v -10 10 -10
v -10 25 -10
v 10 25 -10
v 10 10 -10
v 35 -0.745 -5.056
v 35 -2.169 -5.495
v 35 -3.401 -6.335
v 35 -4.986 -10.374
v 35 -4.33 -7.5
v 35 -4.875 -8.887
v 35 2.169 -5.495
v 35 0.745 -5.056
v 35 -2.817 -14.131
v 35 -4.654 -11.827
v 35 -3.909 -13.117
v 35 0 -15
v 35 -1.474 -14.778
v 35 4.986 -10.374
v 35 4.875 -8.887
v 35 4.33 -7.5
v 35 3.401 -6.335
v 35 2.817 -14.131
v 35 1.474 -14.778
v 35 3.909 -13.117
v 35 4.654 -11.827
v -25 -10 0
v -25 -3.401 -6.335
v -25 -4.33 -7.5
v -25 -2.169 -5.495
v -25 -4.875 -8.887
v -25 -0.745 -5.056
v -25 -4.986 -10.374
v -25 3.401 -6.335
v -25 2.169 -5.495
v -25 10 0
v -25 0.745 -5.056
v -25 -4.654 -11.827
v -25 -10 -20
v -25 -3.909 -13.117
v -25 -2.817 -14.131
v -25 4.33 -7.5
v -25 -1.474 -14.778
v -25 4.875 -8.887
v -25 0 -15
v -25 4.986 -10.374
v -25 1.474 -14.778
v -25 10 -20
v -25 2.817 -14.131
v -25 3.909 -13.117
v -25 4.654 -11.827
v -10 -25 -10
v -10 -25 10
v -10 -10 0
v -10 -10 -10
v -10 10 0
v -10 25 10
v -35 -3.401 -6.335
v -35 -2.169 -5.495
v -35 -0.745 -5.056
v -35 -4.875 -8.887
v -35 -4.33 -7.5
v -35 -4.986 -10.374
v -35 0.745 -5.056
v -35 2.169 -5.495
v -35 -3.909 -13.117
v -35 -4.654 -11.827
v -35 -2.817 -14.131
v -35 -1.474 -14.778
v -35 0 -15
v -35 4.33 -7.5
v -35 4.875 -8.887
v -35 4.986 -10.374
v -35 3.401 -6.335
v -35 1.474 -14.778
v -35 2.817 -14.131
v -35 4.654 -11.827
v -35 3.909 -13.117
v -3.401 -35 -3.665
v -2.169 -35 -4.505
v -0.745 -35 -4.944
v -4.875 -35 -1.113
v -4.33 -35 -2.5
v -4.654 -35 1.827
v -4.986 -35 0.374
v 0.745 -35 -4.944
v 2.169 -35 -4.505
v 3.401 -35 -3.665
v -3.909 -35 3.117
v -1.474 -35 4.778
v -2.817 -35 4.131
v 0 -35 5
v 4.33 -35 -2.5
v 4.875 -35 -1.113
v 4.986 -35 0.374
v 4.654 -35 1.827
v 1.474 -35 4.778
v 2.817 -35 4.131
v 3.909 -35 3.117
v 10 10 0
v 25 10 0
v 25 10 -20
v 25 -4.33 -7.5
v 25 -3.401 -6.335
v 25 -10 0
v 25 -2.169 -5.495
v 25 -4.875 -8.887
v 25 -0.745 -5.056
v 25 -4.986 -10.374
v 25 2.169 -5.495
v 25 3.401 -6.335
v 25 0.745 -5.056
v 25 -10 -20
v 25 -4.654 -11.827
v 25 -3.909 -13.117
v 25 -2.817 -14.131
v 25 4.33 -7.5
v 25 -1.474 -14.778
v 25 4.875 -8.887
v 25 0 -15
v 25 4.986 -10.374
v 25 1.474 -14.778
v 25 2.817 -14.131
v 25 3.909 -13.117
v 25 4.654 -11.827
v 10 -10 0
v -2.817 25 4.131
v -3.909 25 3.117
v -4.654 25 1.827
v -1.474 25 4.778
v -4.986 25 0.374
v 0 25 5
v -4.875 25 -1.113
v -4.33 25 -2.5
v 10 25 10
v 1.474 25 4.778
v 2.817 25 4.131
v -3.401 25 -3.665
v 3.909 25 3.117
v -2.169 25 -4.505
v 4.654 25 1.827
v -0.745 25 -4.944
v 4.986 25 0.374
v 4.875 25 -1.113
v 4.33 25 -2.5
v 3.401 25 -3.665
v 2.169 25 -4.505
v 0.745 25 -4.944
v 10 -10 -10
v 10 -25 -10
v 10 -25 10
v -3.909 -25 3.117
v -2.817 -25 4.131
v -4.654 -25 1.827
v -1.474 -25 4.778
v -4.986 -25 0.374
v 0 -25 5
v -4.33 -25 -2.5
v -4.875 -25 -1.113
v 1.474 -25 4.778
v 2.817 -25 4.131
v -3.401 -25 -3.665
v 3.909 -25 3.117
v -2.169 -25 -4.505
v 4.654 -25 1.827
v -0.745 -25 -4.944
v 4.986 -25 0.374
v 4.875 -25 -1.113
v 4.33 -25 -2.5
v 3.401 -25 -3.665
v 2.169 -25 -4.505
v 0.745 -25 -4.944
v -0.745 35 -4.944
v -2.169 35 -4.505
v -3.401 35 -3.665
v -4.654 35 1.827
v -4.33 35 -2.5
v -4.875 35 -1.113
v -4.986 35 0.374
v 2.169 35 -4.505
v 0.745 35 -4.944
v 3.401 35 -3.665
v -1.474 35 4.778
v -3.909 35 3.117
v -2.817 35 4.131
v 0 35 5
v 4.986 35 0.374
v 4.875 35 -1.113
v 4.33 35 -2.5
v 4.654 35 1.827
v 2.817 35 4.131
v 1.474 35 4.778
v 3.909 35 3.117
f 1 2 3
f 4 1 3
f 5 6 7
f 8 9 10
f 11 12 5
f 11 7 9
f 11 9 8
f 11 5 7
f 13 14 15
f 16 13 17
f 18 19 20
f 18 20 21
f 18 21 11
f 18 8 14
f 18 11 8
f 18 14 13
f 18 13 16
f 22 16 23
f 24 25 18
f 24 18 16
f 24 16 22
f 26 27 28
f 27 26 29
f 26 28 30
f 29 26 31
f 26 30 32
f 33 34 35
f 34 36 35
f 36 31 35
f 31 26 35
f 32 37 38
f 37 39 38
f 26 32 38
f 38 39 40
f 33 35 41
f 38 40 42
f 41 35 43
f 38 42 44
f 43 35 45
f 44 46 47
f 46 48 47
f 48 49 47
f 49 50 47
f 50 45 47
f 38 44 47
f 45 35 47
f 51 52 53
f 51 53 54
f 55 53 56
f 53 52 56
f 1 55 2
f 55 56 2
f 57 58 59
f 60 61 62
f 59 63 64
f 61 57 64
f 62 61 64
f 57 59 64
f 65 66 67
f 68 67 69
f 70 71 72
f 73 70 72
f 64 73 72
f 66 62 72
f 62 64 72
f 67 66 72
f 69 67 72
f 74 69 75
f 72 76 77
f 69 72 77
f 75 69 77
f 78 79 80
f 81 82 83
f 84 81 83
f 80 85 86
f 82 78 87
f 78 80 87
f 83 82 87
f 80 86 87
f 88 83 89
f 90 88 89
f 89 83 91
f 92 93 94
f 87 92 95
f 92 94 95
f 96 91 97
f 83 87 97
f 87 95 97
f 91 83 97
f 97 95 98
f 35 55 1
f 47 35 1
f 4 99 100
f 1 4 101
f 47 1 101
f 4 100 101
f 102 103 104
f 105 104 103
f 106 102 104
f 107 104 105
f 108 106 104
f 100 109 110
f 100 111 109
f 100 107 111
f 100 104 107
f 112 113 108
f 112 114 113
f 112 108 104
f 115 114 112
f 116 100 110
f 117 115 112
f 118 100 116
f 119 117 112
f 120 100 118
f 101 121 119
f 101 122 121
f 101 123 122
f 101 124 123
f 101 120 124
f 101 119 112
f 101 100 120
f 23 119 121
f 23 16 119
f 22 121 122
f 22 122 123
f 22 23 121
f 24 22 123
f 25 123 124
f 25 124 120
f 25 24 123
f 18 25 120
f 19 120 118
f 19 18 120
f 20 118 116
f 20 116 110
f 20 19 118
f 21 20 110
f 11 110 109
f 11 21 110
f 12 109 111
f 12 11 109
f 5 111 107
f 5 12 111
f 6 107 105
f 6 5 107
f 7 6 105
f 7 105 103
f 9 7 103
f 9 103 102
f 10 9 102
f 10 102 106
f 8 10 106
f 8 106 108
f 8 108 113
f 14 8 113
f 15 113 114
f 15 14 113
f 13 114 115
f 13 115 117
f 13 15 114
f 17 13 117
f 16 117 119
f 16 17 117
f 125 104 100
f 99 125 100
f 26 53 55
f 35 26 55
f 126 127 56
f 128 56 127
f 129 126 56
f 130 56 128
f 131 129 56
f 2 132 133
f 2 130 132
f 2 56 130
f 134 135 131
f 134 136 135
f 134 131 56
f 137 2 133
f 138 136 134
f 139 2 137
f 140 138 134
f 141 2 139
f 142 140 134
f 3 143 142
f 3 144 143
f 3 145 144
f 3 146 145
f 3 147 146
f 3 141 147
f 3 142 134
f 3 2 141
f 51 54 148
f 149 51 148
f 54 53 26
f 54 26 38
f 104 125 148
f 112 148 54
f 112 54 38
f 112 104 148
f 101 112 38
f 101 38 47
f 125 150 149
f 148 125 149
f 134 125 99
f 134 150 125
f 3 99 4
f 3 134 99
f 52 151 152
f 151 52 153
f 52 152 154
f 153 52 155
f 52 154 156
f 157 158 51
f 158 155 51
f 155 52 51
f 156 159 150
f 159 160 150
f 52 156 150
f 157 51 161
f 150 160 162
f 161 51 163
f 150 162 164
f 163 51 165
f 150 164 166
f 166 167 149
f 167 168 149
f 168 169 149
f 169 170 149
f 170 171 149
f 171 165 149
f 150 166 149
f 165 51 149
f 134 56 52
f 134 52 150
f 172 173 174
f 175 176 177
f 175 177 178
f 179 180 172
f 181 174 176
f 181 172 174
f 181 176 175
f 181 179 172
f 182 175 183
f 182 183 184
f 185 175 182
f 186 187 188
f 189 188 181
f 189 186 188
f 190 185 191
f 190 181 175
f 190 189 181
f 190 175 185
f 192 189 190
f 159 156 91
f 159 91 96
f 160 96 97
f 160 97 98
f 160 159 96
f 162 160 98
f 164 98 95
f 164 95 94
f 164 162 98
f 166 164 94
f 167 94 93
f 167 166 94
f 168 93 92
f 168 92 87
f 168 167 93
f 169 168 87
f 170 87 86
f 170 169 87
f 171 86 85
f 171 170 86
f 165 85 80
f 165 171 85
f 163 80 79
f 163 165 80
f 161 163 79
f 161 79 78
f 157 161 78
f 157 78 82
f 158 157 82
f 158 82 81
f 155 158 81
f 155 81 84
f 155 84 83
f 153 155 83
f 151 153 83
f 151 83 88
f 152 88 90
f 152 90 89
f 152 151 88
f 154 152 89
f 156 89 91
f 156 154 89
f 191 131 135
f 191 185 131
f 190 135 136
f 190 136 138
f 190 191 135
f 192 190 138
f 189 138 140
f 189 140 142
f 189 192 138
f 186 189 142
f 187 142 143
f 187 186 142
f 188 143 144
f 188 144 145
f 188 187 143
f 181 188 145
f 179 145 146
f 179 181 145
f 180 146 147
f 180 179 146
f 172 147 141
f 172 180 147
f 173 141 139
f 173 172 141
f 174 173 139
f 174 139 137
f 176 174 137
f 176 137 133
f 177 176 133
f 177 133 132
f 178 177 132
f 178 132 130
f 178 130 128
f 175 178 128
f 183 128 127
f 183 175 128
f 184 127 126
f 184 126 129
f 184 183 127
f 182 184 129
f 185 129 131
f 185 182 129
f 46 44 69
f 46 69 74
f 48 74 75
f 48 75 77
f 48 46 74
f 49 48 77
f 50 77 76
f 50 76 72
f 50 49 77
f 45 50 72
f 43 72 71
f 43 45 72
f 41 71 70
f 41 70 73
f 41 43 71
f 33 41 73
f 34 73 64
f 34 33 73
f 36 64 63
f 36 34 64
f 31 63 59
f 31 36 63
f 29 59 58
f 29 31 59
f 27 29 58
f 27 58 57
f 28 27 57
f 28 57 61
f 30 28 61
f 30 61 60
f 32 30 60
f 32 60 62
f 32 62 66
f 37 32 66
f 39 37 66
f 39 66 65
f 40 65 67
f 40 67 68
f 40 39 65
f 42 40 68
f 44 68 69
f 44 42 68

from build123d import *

# Parameters (mm, degrees)
SKETCH1_W           = 20
SKETCH1_H           = 20
BOSS_EXTRUDE1_DEPTH = 25
SKETCH2_W           = 20
SKETCH2_H           = 20
BOSS_EXTRUDE2_DEPTH = 25
SKETCH3_R           = 5
BOSS_EXTRUDE3_DEPTH = 35
SKETCH5_R           = 5
BOSS_EXTRUDE4_DEPTH = 35


with BuildPart() as part:
    # Sketch1 → Boss-Extrude1 (new, symmetric)
    with BuildSketch(Plane(origin=(0, 0, 0), x_dir=(1, 0, 0), z_dir=(0, 1, 0))):
        Rectangle(SKETCH1_W, SKETCH1_H)
    extrude(amount=BOSS_EXTRUDE1_DEPTH, both=True)

    # Sketch2 → Boss-Extrude2 (add, symmetric)
    with BuildSketch(Plane(origin=(0, 0, 0), x_dir=(0, 0, -1), z_dir=(1, 0, 0))):
        with Locations((10, 0)):
            Rectangle(SKETCH2_W, SKETCH2_H)
    extrude(amount=BOSS_EXTRUDE2_DEPTH, both=True)

    # Sketch3 → Boss-Extrude3 (add, symmetric)
    with BuildSketch(Plane(origin=(0, 0, 0), x_dir=(1, 0, 0), z_dir=(0, 1, 0))):
        with Locations(Location((0, 0, 0), (0, 0, 270))):
            Circle(SKETCH3_R)
    extrude(amount=BOSS_EXTRUDE3_DEPTH, both=True)

    # Sketch5 → Boss-Extrude4 (add, symmetric)
    with BuildSketch(Plane(origin=(0, 0, 0), x_dir=(0, 0, -1), z_dir=(1, 0, 0))):
        with Locations((10, 0)):
            Circle(SKETCH5_R)
    extrude(amount=BOSS_EXTRUDE4_DEPTH, both=True)


solid = part.part
